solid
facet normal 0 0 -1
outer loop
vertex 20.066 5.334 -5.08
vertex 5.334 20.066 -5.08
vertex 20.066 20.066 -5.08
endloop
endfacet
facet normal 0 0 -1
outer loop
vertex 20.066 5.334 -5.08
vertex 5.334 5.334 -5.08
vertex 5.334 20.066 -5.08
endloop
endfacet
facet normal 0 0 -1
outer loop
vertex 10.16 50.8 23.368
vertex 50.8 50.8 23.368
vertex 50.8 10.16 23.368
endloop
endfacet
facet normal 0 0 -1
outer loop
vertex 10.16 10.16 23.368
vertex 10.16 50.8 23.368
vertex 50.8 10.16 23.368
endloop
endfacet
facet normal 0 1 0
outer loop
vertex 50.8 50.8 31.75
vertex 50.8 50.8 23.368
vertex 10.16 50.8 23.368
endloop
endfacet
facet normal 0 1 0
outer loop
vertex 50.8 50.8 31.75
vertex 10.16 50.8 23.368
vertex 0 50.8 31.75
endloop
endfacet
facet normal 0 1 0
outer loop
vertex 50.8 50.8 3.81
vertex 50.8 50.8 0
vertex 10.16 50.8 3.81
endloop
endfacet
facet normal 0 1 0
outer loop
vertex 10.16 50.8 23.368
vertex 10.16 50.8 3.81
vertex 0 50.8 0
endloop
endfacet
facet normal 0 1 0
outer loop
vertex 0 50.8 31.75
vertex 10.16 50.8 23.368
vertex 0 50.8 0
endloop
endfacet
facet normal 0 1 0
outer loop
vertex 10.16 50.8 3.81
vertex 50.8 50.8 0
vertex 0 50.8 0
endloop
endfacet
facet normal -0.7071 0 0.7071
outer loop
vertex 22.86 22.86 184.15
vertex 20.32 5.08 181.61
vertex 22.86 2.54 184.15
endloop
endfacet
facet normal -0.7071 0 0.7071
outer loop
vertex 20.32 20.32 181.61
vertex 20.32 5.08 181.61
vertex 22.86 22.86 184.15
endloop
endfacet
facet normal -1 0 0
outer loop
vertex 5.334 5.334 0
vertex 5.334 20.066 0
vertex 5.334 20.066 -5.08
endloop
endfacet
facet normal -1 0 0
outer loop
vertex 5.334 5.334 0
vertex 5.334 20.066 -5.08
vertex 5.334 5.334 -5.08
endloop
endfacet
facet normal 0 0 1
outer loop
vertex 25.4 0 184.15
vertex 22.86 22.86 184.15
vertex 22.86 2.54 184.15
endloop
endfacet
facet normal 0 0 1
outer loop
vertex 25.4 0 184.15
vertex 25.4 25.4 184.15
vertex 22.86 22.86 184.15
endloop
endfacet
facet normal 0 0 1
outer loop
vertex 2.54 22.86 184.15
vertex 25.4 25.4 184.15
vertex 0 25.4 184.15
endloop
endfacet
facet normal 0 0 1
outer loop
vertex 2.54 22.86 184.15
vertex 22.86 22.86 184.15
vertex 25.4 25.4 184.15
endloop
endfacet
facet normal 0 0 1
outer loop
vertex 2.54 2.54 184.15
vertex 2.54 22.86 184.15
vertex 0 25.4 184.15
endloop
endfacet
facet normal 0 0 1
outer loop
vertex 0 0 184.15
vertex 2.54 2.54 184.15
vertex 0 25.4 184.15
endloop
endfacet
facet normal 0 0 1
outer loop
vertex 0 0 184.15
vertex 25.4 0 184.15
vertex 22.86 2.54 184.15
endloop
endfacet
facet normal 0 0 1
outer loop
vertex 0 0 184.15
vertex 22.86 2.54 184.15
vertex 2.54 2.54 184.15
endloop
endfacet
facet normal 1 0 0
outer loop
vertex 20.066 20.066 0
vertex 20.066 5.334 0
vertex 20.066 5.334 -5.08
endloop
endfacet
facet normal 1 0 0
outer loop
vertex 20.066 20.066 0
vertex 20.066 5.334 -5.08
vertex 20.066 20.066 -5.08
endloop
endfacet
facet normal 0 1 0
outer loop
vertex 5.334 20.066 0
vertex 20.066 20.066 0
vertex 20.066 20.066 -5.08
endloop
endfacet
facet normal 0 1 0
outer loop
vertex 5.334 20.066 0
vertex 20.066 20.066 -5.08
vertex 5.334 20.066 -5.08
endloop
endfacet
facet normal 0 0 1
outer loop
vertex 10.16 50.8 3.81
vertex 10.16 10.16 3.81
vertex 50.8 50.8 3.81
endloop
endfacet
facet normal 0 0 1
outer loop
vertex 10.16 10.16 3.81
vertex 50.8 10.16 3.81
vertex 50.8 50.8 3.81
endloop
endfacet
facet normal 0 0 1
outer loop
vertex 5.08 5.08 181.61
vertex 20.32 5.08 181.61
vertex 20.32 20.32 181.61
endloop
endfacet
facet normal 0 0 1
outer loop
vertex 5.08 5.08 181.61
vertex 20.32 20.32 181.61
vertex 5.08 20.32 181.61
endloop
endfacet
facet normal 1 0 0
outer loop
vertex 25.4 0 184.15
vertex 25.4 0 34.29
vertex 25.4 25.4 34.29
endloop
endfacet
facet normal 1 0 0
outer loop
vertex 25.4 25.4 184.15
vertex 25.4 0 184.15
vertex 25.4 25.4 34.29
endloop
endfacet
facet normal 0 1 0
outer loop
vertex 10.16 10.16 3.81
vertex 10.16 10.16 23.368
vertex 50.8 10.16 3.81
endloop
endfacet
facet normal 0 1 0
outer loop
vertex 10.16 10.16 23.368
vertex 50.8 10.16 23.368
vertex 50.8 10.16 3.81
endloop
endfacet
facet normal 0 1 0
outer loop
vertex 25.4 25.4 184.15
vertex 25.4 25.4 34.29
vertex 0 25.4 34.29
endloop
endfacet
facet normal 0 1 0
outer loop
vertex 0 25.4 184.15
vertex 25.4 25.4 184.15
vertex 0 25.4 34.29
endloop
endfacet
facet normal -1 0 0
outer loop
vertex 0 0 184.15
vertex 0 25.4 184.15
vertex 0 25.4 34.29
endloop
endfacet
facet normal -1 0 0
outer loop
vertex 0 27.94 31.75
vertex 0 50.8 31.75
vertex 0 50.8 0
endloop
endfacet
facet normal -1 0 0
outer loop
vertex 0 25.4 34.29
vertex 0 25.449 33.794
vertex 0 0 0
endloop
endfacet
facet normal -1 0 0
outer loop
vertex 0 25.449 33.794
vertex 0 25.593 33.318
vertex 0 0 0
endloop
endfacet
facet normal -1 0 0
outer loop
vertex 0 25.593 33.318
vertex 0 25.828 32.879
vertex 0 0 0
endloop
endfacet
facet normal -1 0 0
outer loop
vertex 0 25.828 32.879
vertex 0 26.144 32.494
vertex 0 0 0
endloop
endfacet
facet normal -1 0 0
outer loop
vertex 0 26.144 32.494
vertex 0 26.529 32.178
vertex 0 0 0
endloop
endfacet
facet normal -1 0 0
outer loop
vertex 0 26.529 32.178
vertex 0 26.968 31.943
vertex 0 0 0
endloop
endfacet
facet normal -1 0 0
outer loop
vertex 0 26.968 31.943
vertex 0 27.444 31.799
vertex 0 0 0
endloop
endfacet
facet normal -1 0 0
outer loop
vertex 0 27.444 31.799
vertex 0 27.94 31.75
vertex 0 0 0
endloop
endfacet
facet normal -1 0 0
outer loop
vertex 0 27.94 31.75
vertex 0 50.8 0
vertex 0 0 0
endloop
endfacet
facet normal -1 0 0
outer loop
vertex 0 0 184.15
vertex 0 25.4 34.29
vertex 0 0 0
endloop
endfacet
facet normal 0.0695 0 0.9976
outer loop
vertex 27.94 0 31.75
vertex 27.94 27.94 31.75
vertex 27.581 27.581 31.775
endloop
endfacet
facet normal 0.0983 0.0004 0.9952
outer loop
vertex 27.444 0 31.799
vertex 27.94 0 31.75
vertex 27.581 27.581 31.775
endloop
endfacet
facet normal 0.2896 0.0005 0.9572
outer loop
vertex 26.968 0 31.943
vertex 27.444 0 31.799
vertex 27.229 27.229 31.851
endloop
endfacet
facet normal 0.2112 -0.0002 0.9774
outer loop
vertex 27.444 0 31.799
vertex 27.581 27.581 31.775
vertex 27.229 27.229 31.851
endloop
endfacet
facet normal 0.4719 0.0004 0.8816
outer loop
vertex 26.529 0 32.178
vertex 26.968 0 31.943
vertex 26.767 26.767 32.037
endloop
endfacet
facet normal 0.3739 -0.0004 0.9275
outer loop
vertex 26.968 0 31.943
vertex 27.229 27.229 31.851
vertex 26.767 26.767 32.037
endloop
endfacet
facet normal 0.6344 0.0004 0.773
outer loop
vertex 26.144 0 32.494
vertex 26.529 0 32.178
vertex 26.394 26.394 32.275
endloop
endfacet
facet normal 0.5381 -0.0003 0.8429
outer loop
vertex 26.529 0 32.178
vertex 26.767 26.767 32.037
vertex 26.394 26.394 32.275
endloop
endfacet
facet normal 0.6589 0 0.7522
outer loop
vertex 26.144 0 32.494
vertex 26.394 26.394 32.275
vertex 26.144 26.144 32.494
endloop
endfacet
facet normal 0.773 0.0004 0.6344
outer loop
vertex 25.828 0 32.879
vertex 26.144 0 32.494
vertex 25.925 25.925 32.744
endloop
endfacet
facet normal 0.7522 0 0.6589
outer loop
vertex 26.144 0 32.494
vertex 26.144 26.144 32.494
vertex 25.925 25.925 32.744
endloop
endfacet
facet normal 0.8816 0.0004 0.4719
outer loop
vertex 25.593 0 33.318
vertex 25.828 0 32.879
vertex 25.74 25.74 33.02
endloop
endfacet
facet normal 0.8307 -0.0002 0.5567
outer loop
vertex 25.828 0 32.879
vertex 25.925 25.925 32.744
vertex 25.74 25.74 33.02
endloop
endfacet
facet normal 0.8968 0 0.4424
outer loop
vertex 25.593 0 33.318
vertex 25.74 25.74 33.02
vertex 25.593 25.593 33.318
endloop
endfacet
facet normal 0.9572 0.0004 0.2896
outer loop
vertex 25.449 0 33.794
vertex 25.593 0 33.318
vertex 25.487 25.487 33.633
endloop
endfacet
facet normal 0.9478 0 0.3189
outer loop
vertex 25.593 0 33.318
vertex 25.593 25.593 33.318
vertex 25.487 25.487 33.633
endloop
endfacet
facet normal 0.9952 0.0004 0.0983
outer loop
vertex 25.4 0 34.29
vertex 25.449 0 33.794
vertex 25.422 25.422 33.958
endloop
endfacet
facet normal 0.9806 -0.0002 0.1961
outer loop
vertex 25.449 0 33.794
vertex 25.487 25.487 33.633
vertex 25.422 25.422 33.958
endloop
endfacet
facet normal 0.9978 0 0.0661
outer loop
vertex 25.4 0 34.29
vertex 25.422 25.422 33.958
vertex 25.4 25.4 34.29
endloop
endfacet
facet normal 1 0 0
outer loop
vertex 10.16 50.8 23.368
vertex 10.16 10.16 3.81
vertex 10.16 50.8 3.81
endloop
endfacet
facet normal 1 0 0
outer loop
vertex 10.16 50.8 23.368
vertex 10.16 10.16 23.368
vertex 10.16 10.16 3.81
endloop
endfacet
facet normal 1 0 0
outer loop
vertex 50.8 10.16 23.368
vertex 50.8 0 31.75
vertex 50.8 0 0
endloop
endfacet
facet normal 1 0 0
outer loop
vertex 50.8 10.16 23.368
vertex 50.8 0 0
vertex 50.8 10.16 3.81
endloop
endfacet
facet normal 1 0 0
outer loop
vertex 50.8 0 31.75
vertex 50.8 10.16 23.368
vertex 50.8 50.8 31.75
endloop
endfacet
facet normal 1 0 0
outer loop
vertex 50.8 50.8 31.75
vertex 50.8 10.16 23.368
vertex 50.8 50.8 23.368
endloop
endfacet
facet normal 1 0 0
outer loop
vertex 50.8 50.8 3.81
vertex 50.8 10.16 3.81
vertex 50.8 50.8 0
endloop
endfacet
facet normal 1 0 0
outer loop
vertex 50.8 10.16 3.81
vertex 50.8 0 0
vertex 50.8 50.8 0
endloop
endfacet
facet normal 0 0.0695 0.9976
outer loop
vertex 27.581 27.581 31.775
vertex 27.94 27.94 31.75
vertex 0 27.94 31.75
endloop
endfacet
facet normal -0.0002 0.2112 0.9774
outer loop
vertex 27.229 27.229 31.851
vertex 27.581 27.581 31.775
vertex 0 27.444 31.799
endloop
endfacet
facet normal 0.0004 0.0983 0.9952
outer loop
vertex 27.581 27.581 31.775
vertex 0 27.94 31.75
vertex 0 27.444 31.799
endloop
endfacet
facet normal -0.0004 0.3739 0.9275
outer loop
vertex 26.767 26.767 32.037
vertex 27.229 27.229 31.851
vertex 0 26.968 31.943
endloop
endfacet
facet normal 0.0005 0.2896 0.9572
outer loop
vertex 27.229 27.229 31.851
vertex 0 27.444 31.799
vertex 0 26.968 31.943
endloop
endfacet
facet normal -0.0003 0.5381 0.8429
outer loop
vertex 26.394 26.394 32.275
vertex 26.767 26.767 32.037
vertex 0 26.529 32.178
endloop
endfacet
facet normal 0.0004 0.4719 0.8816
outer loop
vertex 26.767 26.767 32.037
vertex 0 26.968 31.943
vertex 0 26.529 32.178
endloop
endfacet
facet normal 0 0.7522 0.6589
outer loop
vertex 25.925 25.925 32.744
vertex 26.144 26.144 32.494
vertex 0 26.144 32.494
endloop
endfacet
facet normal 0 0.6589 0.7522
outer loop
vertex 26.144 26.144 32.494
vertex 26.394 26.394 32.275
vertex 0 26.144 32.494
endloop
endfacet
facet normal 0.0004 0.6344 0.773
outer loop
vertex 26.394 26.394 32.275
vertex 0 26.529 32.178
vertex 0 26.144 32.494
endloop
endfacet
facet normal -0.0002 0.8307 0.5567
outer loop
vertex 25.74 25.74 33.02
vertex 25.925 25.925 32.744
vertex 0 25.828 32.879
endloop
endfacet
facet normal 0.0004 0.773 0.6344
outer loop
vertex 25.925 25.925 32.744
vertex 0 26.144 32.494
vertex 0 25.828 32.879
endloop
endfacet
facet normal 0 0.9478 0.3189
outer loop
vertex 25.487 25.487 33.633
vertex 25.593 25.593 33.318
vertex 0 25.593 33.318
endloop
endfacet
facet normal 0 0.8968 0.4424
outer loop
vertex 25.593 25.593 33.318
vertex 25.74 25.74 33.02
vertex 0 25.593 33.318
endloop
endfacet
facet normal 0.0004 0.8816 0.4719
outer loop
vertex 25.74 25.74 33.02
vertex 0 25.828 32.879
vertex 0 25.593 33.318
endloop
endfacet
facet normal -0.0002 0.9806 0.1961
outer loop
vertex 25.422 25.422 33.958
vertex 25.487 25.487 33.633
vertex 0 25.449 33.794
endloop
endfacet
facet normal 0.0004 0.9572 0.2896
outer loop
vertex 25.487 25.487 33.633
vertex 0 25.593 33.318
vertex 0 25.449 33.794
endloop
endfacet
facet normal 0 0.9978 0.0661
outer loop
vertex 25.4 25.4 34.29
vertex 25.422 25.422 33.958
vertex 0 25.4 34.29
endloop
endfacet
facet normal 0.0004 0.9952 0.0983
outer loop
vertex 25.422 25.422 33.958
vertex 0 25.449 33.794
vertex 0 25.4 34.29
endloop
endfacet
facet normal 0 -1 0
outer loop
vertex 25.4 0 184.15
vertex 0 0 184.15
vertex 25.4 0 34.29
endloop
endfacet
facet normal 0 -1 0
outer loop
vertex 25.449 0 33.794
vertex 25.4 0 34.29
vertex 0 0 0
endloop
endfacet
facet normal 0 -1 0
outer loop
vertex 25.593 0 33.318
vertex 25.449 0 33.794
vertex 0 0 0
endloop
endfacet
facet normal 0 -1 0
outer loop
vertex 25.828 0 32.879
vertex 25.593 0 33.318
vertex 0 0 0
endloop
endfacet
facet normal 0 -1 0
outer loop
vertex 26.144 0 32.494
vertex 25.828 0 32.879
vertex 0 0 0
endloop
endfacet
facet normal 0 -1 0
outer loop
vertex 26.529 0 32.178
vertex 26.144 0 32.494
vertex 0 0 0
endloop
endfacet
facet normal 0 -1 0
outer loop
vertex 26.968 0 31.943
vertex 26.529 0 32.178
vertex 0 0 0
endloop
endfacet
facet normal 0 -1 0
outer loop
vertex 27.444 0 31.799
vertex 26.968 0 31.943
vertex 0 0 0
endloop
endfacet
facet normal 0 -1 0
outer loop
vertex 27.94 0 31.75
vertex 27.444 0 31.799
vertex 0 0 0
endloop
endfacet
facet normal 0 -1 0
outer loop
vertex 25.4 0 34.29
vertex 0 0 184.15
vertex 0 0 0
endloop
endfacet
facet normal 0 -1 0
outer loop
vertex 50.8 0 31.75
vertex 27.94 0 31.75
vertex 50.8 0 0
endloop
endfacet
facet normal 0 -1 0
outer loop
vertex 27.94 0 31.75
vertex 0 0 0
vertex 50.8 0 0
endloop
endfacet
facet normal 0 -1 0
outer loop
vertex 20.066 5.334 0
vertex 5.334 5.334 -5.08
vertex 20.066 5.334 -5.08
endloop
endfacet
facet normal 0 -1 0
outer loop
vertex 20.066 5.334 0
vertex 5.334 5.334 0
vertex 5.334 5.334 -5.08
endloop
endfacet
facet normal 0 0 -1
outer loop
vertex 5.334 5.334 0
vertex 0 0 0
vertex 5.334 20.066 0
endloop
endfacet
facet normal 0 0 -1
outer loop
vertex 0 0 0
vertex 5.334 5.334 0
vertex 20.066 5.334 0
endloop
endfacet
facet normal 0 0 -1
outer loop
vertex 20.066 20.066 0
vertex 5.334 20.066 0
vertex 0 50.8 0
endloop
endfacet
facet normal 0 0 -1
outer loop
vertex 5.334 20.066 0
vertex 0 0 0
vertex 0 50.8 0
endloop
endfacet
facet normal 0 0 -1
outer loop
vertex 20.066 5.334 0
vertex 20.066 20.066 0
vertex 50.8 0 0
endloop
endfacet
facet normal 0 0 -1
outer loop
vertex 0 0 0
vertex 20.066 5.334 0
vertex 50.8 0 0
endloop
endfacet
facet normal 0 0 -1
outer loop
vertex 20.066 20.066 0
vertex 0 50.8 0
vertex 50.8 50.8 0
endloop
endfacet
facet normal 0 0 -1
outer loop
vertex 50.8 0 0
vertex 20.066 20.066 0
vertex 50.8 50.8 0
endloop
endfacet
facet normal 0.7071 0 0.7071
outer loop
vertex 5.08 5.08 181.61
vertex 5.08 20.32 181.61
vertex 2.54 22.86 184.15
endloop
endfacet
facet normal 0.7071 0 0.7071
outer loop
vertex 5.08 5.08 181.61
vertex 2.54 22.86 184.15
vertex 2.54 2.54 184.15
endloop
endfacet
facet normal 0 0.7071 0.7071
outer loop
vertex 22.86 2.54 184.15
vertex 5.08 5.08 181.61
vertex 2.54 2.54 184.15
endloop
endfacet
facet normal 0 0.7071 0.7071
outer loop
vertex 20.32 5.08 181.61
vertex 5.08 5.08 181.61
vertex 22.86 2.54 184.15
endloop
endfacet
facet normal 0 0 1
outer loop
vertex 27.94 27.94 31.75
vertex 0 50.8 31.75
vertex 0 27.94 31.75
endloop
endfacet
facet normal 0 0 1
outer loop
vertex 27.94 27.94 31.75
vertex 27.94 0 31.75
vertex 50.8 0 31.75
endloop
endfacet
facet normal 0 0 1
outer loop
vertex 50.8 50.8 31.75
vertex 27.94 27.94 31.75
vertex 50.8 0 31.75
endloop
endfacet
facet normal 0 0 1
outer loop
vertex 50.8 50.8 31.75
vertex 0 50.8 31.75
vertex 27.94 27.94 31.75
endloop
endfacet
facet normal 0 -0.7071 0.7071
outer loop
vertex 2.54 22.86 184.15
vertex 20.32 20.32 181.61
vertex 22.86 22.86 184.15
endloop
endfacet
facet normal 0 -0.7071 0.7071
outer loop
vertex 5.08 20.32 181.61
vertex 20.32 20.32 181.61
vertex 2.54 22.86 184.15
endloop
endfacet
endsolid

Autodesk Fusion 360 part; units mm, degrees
sketch "Sketch1" plane through (0, 0, 0) normal (0, 0, 1) x (1, 0, 0)
  line L0 (0, 0) -> (50.8, 0)
  line L1 (50.8, 0) -> (50.8, 50.8)
  line L2 (50.8, 50.8) -> (0, 50.8)
  line L3 (0, 50.8) -> (0, 0)
  dimension "d1" = 50.8
  dimension "d2" = 50.8
extrude "Extrude1" add sketch "Sketch1" along normal blind 31.75
sketch "Sketch2" plane through (50.8, 0, 0) normal (1, 0, 0) x (0, 1, 0)
  line L0 (0, 0) -> (50.8, 0)
  line L1 (50.8, 0) -> (50.8, 31.75)
  line L2 (50.8, 31.75) -> (0, 31.75)
  line L3 (0, 31.75) -> (0, 0)
  line L4 (50.8, 23.368) -> (10.16, 23.368)
  line L5 (10.16, 23.368) -> (10.16, 3.81)
  line L6 (10.16, 3.81) -> (50.8, 3.81)
  line L7 (50.8, 3.81) -> (50.8, 23.368)
  dimension "d5" = 40.64
  dimension "d6" = 19.558
  dimension "d14" = 3.81
extrude "Extrude2" cut sketch "Sketch2" against normal blind 40.64 contours L1 L4 L5 L6 L7
sketch "Sketch3" plane through (0, 0, 31.75) normal (0, 0, 1) x (-1, 0, 0)
  line L0 (0, -50.8) -> (0, 0)
  line L1 (0, 0) -> (-50.8, 0)
  line L2 (-50.8, 0) -> (-50.8, -50.8)
  line L3 (-50.8, -50.8) -> (0, -50.8)
  line L4 (0, 0) -> (-25.4, 0)
  line L5 (-25.4, 0) -> (-25.4, -25.4)
  line L6 (-25.4, -25.4) -> (0, -25.4)
  line L7 (0, -25.4) -> (0, 0)
  dimension "d10" = 25.4
  dimension "d11" = 25.4
extrude "Extrude3" add sketch "Sketch3" along normal blind 152.4 contours L0 L1 L4 L5 L6 L7
fillet "Fillet1" radius 2.54 2 edges at (25.4, 12.7, 31.75) (12.7, 25.4, 31.75)
sketch "Sketch4" plane through (0, 0, 0) normal (0, 0, -1) x (1, 0, 0)
  line L0 (0, 0) -> (0, -50.8)
  line L1 (0, -50.8) -> (50.8, -50.8)
  line L2 (50.8, -50.8) -> (50.8, 0)
  line L3 (50.8, 0) -> (0, 0)
  line L4 (2.54, -2.54) -> (22.86, -2.54)
  line L5 (22.86, -2.54) -> (22.86, -22.86)
  line L6 (22.86, -22.86) -> (2.54, -22.86)
  line L7 (2.54, -22.86) -> (2.54, -2.54)
  dimension "d17" = 2.54
  dimension "d18" = 2.54
  dimension "d19" = 20.32
  dimension "d20" = 20.32
sketch "Sketch5" plane through (0, 0, 0) normal (0, 0, -1) x (1, 0, 0)
  line L0 (5.334, -5.334) -> (20.066, -5.334)
  line L1 (20.066, -5.334) -> (20.066, -20.066)
  line L2 (20.066, -20.066) -> (5.334, -20.066)
  line L3 (5.334, -20.066) -> (5.334, -5.334)
  line L4 (0, -50.8) -> (0, 0)
  line L5 (0, 0) -> (50.8, 0)
  dimension "d37" = 14.732
  dimension "d38" = 14.732
  dimension "d39" = 5.334
  dimension "d40" = 5.334
sketch "Sketch6" plane through (0, 0, 184.15) normal (0, 0, 1) x (-1, 0, 0)
  line L0 (0, -25.4) -> (0, 0)
  line L1 (0, 0) -> (-25.4, 0)
  line L2 (-25.4, 0) -> (-25.4, -25.4)
  line L3 (-25.4, -25.4) -> (0, -25.4)
  line L4 (-2.54, -22.86) -> (-22.86, -22.86)
  line L5 (-22.86, -22.86) -> (-22.86, -2.54)
  line L6 (-22.86, -2.54) -> (-2.54, -2.54)
  line L7 (-2.54, -2.54) -> (-2.54, -22.86)
  line L8 (-5.08, -20.32) -> (-20.32, -20.32)
  line L9 (-20.32, -20.32) -> (-20.32, -5.08)
  line L10 (-20.32, -5.08) -> (-5.08, -5.08)
  line L11 (-5.08, -5.08) -> (-5.08, -20.32)
  dimension "d27" = 2.54
  dimension "d28" = 2.54
  dimension "d29" = 2.54
  dimension "d30" = 20.32
  dimension "d31" = 2.54
  dimension "d32" = 15.24
  dimension "d33" = 15.24
  dimension "d34" = 2.54
extrude "Extrude5" cut sketch "Sketch6" against normal blind 2.54 contours L8 L9 L10 L11
loft "Loft2" cut profiles "Sketch6" section 1 contours L4 L5 L6 L7 section 2 face at (15.24, 15.24, 181.61)
extrude "Extrude6" add sketch "Sketch5" along normal blind 5.08
